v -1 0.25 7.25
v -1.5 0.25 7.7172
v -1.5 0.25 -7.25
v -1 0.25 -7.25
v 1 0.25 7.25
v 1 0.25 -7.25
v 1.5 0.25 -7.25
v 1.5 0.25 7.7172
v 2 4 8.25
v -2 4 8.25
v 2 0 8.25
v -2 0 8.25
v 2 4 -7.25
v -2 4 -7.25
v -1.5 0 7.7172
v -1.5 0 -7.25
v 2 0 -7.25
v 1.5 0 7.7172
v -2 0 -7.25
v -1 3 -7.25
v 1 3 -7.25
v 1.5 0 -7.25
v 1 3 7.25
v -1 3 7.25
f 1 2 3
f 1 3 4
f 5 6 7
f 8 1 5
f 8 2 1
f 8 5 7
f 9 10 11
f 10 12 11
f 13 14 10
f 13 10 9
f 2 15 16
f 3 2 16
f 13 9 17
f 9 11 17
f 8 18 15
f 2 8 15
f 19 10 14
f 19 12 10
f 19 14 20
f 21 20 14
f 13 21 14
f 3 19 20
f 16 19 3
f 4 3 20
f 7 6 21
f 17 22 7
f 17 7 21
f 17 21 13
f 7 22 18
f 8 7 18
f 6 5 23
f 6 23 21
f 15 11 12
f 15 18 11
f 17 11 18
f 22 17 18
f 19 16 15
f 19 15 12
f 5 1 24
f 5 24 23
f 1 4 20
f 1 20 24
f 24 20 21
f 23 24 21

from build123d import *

# Parameters (mm, degrees)
BOSS_EXTRUDE1_DEPTH = 3
SKETCH2_W           = 4
SKETCH2_H           = 15.5
BOSS_EXTRUDE2_DEPTH = 1
CUT_EXTRUDE1_DEPTH  = 0.25


with BuildPart() as part:
    # Sketch1 → Boss-Extrude1 (new body)
    with BuildSketch(Plane(origin=(0, 0, 0), x_dir=(1, 0, 0), z_dir=(0, 1, 0))):
        Polygon((-1, -7.25), (1, -7.25), (1, 7.25), (2, 7.25), (2, -7.25), (2, -8.25), (1, -8.25), (-2, -8.25), (-2, 7.25), (-1, 7.25), align=None)
    extrude(amount=BOSS_EXTRUDE1_DEPTH)

    # Sketch2 → Boss-Extrude2 (add)
    with BuildSketch(Plane(origin=(0, 3, 0), x_dir=(1, 0, 0), z_dir=(0, 1, 0))):
        with Locations((0, -0.5)):
            Rectangle(SKETCH2_W, SKETCH2_H)
    extrude(amount=BOSS_EXTRUDE2_DEPTH)

    # Sketch3 → Cut-Extrude1 (cut)
    with BuildSketch(Plane.XZ):
        Polygon((-1, 7.25), (1, 7.25), (1, -7.25), (1.5, -7.25), (1.5, 7.717200742), (-1.5, 7.717200742), (-1.5, -7.25), (-1, -7.25), align=None)
    extrude(amount=-CUT_EXTRUDE1_DEPTH, mode=Mode.SUBTRACT)


solid = part.part
